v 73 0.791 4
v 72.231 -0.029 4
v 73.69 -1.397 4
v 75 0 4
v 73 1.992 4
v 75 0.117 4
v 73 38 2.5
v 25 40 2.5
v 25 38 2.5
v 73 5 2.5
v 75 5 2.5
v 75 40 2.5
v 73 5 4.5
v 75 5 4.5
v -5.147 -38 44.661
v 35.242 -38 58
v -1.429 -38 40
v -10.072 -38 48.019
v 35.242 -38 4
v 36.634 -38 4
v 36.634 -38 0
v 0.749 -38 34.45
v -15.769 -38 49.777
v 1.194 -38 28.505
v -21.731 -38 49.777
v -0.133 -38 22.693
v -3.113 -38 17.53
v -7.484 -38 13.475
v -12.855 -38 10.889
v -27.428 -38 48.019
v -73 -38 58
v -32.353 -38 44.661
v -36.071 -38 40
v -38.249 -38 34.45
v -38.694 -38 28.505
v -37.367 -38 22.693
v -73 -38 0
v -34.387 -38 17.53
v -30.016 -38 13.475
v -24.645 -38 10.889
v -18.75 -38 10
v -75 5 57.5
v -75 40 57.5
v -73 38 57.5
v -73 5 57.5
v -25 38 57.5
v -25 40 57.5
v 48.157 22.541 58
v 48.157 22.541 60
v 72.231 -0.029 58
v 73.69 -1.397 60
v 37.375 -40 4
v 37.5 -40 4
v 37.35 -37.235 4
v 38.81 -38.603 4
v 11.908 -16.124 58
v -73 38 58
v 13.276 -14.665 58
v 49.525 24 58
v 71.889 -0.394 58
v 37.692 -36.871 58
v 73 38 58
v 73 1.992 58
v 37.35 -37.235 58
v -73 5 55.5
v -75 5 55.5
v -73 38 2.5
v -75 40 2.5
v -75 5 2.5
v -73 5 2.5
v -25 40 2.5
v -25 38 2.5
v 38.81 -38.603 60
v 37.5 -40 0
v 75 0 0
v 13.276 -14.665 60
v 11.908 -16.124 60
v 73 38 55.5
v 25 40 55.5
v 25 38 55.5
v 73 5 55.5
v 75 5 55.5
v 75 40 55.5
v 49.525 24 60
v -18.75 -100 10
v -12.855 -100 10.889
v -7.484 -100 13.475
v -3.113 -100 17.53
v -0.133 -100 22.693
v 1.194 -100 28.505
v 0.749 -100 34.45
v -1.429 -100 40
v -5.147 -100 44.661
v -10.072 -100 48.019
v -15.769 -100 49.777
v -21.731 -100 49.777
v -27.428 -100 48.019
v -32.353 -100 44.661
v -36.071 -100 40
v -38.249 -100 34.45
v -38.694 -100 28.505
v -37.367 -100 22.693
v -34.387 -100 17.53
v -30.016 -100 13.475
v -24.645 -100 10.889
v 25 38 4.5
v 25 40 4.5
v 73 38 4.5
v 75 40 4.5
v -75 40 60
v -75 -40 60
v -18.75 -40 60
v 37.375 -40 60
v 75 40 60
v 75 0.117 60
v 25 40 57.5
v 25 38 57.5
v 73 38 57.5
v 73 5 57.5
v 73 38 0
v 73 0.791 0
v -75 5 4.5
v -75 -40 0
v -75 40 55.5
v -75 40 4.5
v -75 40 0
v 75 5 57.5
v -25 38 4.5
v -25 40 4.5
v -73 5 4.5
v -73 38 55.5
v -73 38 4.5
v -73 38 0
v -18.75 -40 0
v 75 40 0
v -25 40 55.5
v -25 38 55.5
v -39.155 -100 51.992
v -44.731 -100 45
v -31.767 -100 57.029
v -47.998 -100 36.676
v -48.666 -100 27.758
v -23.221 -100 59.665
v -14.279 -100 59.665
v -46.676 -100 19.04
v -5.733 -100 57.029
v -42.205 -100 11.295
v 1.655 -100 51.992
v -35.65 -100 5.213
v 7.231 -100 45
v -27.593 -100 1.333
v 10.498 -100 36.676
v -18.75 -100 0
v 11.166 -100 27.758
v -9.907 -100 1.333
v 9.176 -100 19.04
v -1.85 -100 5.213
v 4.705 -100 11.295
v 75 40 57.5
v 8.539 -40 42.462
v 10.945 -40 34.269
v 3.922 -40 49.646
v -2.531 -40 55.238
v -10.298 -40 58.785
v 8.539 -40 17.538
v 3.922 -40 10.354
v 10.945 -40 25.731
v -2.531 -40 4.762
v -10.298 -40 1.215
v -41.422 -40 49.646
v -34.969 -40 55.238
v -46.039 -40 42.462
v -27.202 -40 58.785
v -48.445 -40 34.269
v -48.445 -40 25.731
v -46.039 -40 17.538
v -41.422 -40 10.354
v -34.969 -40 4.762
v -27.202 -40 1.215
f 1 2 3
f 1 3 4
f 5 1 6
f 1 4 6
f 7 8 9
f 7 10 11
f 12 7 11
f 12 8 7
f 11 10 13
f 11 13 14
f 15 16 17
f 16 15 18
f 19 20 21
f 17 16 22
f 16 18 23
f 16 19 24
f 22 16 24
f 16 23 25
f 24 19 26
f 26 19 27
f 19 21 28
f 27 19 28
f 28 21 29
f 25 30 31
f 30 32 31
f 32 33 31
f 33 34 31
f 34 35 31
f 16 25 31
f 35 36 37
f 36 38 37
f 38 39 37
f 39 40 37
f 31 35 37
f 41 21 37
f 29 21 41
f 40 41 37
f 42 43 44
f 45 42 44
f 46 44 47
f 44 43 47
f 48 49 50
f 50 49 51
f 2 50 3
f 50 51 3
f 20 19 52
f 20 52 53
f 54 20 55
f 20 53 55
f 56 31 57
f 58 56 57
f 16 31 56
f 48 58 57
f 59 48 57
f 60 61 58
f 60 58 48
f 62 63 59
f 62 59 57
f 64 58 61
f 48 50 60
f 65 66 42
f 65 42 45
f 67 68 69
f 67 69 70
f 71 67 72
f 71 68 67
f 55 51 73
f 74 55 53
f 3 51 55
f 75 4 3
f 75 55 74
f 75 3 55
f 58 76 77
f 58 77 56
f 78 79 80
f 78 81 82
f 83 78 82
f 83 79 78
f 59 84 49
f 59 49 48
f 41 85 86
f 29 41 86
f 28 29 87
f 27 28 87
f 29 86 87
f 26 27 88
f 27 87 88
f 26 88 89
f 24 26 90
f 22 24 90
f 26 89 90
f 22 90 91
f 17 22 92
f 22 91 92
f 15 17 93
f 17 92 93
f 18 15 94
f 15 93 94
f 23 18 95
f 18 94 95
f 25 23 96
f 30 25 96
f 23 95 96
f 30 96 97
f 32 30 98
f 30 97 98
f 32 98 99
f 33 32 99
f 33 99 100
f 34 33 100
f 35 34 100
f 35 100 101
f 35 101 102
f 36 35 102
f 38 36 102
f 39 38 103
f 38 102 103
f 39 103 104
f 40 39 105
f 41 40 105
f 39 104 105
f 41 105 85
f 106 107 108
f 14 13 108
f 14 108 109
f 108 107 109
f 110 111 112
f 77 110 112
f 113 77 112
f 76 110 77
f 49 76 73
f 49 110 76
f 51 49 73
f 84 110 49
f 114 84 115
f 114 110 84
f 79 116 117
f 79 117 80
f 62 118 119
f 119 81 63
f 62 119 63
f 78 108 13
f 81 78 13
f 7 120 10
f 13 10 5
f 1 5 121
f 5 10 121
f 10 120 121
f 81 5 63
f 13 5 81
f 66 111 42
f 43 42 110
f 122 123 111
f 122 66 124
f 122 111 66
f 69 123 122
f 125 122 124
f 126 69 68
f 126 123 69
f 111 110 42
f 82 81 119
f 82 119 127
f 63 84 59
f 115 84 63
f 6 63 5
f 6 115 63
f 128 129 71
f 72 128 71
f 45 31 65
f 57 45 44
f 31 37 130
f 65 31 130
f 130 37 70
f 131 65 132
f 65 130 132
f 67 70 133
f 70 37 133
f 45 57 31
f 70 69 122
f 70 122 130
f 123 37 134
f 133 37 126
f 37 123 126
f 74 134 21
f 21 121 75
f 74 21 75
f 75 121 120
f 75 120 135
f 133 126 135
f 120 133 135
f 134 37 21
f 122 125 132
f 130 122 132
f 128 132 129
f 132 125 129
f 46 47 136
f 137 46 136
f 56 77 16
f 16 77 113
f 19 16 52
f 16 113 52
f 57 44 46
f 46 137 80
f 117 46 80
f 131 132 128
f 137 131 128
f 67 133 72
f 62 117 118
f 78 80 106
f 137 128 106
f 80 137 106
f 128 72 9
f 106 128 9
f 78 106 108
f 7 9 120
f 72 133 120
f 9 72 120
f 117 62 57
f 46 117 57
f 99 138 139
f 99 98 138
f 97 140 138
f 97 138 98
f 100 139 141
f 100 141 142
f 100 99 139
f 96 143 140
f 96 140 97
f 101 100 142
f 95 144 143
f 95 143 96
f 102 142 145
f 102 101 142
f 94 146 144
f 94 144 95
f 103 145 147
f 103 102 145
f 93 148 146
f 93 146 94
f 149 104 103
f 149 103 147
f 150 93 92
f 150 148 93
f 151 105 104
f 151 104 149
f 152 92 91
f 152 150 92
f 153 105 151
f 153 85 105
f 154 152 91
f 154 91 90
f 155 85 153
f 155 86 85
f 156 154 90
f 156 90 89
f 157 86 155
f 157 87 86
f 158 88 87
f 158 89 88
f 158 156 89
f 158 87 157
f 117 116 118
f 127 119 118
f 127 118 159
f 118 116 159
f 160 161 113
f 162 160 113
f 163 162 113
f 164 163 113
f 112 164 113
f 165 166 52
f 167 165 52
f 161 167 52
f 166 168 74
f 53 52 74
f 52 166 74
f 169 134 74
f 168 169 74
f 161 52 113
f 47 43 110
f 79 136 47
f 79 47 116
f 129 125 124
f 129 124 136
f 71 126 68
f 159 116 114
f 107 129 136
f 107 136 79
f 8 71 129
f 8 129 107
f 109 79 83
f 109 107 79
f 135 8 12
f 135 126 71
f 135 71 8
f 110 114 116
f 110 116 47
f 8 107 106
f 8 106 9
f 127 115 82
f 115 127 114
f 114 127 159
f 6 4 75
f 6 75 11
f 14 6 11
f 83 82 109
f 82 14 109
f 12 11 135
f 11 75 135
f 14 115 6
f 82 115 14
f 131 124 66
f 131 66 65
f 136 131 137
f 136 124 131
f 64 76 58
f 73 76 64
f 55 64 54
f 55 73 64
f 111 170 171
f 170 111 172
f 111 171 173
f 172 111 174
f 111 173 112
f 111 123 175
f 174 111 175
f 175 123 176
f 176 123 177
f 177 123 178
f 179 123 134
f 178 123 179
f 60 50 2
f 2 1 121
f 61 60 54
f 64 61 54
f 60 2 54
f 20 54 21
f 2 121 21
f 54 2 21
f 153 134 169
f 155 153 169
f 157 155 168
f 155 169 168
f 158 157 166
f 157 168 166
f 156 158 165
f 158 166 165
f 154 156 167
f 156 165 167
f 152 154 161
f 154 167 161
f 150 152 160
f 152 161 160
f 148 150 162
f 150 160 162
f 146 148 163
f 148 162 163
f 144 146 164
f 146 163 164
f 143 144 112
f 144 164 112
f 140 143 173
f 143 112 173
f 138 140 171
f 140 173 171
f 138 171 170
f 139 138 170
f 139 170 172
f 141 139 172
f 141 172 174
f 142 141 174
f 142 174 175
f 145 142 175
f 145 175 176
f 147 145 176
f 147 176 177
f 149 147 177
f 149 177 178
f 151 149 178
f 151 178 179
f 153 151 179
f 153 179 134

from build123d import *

# Parameters (mm, degrees)
SKETCH_1_W           = 150
SKETCH_1_H           = 80
EXTRUDE_1_DEPTH      = 60
CUT_EXTRUDE_2_DEPTH  = 60
SKETCH_3_W           = 50
SKETCH_3_H           = 2
CUT_EXTRUDE_3_DEPTH  = 35
SKETCH_4_W           = 2
SKETCH_4_H           = 50
CUT_EXTRUDE_4_DEPTH  = 35
SKETCH_5_R           = 30
EXTRUDE_2_DEPTH      = 60
CUT_EXTRUDE_5_DEPTH  = 58
SKETCH_7_R           = 20
CUT_EXTRUDE_8_DEPTH  = 62
SKETCH_8_W           = 58.287497292
SKETCH_8_H           = 2
CUT_EXTRUDE_12_DEPTH = 35
SKETCH_10_W          = 2
SKETCH_10_H          = 50
EXTRUDE_6_DEPTH      = 2


with BuildPart() as part:
    # 草图1 → 凸台-拉伸1 (new body)
    with BuildSketch(Plane.XY):
        Rectangle(SKETCH_1_W, SKETCH_1_H)
    extrude(amount=EXTRUDE_1_DEPTH)

    # 草图2 → 切除-拉伸2 (cut)
    with BuildSketch(Plane.XY.offset(60)):
        Polygon((75, 0), (37.5, -40), (75, -40), align=None)
    extrude(amount=-CUT_EXTRUDE_2_DEPTH, mode=Mode.SUBTRACT)

    # 草图3 → 切除-拉伸3 (cut)
    with BuildSketch(Plane(origin=(0, 40, 0), x_dir=(1, 0, 0), z_dir=(0, 1, 0))):
        with Locations((-50, -56.5)):
            Rectangle(SKETCH_3_W, SKETCH_3_H)
        with Locations((-50, -3.5)):
            Rectangle(SKETCH_3_W, SKETCH_3_H)
        with Locations((50, -56.5)):
            Rectangle(SKETCH_3_W, SKETCH_3_H)
        with Locations((50, -3.5)):
            Rectangle(SKETCH_3_W, SKETCH_3_H)
    extrude(amount=-CUT_EXTRUDE_3_DEPTH, mode=Mode.SUBTRACT)

    # 草图4 → 切除-拉伸4 (cut)
    with BuildSketch(Plane(origin=(39.916839917, -37.422037422, 0), x_dir=(0, 0, -1), z_dir=(0.7295372041400852, -0.6839411288813299, 0))):
        with Locations((-3, 23.880944417)):
            Rectangle(SKETCH_4_W, SKETCH_4_H)
        with Locations((-57, 23.880944417)):
            Rectangle(SKETCH_4_W, SKETCH_4_H)
    extrude(amount=-CUT_EXTRUDE_4_DEPTH, mode=Mode.SUBTRACT)

    # 草图5 → 凸台-拉伸2 (add)
    with BuildSketch(Plane.XZ.offset(40)):
        with Locations(Location((-18.75, 30, 0), (0, 0, 270))):
            Circle(SKETCH_5_R)
    extrude(amount=EXTRUDE_2_DEPTH)

    # 草图6 → 切除-拉伸5 (cut)
    with BuildSketch(Plane(origin=(0, 0, 0), x_dir=(-1, 0, 0), z_dir=(0, 0, -1))):
        Polygon((73, -38), (73, 38), (-73, 38), (-73, 0.79089496), (-36.633535975, -38), align=None)
    extrude(amount=-CUT_EXTRUDE_5_DEPTH, mode=Mode.SUBTRACT)

    # 草图7 → 切除-拉伸8 (cut)
    with BuildSketch(Plane.XZ.offset(100)):
        with Locations(Location((-18.75, 30, 0), (0, 0, 270))):
            Circle(SKETCH_7_R)
    extrude(amount=-CUT_EXTRUDE_8_DEPTH, mode=Mode.SUBTRACT)

    # 草图8 → 切除-拉伸12 (cut)
    with BuildSketch(Plane(origin=(39.916839917, -37.422037422, 0), x_dir=(0, 0, -1), z_dir=(0.7295372041400852, -0.6839411288813299, 0))):
        with Locations((-33.143748646, 50.380944417)):
            Rectangle(SKETCH_8_W, SKETCH_8_H)
        with Locations((-33.143748646, -2.619055583)):
            Rectangle(SKETCH_8_W, SKETCH_8_H)
    extrude(amount=-CUT_EXTRUDE_12_DEPTH, mode=Mode.SUBTRACT)

    # 草图10 → 凸台-拉伸6 (add)
    with BuildSketch(Plane(origin=(39.916839917, -37.422037422, 0), x_dir=(0, 0, -1), z_dir=(0.7295372041400852, -0.6839411288813299, 0))):
        with Locations((-57, 23.880944417)):
            Rectangle(SKETCH_10_W, SKETCH_10_H)
        with Locations((-3, 23.880944417)):
            Rectangle(SKETCH_10_W, SKETCH_10_H)
    extrude(amount=-EXTRUDE_6_DEPTH)


solid = part.part
